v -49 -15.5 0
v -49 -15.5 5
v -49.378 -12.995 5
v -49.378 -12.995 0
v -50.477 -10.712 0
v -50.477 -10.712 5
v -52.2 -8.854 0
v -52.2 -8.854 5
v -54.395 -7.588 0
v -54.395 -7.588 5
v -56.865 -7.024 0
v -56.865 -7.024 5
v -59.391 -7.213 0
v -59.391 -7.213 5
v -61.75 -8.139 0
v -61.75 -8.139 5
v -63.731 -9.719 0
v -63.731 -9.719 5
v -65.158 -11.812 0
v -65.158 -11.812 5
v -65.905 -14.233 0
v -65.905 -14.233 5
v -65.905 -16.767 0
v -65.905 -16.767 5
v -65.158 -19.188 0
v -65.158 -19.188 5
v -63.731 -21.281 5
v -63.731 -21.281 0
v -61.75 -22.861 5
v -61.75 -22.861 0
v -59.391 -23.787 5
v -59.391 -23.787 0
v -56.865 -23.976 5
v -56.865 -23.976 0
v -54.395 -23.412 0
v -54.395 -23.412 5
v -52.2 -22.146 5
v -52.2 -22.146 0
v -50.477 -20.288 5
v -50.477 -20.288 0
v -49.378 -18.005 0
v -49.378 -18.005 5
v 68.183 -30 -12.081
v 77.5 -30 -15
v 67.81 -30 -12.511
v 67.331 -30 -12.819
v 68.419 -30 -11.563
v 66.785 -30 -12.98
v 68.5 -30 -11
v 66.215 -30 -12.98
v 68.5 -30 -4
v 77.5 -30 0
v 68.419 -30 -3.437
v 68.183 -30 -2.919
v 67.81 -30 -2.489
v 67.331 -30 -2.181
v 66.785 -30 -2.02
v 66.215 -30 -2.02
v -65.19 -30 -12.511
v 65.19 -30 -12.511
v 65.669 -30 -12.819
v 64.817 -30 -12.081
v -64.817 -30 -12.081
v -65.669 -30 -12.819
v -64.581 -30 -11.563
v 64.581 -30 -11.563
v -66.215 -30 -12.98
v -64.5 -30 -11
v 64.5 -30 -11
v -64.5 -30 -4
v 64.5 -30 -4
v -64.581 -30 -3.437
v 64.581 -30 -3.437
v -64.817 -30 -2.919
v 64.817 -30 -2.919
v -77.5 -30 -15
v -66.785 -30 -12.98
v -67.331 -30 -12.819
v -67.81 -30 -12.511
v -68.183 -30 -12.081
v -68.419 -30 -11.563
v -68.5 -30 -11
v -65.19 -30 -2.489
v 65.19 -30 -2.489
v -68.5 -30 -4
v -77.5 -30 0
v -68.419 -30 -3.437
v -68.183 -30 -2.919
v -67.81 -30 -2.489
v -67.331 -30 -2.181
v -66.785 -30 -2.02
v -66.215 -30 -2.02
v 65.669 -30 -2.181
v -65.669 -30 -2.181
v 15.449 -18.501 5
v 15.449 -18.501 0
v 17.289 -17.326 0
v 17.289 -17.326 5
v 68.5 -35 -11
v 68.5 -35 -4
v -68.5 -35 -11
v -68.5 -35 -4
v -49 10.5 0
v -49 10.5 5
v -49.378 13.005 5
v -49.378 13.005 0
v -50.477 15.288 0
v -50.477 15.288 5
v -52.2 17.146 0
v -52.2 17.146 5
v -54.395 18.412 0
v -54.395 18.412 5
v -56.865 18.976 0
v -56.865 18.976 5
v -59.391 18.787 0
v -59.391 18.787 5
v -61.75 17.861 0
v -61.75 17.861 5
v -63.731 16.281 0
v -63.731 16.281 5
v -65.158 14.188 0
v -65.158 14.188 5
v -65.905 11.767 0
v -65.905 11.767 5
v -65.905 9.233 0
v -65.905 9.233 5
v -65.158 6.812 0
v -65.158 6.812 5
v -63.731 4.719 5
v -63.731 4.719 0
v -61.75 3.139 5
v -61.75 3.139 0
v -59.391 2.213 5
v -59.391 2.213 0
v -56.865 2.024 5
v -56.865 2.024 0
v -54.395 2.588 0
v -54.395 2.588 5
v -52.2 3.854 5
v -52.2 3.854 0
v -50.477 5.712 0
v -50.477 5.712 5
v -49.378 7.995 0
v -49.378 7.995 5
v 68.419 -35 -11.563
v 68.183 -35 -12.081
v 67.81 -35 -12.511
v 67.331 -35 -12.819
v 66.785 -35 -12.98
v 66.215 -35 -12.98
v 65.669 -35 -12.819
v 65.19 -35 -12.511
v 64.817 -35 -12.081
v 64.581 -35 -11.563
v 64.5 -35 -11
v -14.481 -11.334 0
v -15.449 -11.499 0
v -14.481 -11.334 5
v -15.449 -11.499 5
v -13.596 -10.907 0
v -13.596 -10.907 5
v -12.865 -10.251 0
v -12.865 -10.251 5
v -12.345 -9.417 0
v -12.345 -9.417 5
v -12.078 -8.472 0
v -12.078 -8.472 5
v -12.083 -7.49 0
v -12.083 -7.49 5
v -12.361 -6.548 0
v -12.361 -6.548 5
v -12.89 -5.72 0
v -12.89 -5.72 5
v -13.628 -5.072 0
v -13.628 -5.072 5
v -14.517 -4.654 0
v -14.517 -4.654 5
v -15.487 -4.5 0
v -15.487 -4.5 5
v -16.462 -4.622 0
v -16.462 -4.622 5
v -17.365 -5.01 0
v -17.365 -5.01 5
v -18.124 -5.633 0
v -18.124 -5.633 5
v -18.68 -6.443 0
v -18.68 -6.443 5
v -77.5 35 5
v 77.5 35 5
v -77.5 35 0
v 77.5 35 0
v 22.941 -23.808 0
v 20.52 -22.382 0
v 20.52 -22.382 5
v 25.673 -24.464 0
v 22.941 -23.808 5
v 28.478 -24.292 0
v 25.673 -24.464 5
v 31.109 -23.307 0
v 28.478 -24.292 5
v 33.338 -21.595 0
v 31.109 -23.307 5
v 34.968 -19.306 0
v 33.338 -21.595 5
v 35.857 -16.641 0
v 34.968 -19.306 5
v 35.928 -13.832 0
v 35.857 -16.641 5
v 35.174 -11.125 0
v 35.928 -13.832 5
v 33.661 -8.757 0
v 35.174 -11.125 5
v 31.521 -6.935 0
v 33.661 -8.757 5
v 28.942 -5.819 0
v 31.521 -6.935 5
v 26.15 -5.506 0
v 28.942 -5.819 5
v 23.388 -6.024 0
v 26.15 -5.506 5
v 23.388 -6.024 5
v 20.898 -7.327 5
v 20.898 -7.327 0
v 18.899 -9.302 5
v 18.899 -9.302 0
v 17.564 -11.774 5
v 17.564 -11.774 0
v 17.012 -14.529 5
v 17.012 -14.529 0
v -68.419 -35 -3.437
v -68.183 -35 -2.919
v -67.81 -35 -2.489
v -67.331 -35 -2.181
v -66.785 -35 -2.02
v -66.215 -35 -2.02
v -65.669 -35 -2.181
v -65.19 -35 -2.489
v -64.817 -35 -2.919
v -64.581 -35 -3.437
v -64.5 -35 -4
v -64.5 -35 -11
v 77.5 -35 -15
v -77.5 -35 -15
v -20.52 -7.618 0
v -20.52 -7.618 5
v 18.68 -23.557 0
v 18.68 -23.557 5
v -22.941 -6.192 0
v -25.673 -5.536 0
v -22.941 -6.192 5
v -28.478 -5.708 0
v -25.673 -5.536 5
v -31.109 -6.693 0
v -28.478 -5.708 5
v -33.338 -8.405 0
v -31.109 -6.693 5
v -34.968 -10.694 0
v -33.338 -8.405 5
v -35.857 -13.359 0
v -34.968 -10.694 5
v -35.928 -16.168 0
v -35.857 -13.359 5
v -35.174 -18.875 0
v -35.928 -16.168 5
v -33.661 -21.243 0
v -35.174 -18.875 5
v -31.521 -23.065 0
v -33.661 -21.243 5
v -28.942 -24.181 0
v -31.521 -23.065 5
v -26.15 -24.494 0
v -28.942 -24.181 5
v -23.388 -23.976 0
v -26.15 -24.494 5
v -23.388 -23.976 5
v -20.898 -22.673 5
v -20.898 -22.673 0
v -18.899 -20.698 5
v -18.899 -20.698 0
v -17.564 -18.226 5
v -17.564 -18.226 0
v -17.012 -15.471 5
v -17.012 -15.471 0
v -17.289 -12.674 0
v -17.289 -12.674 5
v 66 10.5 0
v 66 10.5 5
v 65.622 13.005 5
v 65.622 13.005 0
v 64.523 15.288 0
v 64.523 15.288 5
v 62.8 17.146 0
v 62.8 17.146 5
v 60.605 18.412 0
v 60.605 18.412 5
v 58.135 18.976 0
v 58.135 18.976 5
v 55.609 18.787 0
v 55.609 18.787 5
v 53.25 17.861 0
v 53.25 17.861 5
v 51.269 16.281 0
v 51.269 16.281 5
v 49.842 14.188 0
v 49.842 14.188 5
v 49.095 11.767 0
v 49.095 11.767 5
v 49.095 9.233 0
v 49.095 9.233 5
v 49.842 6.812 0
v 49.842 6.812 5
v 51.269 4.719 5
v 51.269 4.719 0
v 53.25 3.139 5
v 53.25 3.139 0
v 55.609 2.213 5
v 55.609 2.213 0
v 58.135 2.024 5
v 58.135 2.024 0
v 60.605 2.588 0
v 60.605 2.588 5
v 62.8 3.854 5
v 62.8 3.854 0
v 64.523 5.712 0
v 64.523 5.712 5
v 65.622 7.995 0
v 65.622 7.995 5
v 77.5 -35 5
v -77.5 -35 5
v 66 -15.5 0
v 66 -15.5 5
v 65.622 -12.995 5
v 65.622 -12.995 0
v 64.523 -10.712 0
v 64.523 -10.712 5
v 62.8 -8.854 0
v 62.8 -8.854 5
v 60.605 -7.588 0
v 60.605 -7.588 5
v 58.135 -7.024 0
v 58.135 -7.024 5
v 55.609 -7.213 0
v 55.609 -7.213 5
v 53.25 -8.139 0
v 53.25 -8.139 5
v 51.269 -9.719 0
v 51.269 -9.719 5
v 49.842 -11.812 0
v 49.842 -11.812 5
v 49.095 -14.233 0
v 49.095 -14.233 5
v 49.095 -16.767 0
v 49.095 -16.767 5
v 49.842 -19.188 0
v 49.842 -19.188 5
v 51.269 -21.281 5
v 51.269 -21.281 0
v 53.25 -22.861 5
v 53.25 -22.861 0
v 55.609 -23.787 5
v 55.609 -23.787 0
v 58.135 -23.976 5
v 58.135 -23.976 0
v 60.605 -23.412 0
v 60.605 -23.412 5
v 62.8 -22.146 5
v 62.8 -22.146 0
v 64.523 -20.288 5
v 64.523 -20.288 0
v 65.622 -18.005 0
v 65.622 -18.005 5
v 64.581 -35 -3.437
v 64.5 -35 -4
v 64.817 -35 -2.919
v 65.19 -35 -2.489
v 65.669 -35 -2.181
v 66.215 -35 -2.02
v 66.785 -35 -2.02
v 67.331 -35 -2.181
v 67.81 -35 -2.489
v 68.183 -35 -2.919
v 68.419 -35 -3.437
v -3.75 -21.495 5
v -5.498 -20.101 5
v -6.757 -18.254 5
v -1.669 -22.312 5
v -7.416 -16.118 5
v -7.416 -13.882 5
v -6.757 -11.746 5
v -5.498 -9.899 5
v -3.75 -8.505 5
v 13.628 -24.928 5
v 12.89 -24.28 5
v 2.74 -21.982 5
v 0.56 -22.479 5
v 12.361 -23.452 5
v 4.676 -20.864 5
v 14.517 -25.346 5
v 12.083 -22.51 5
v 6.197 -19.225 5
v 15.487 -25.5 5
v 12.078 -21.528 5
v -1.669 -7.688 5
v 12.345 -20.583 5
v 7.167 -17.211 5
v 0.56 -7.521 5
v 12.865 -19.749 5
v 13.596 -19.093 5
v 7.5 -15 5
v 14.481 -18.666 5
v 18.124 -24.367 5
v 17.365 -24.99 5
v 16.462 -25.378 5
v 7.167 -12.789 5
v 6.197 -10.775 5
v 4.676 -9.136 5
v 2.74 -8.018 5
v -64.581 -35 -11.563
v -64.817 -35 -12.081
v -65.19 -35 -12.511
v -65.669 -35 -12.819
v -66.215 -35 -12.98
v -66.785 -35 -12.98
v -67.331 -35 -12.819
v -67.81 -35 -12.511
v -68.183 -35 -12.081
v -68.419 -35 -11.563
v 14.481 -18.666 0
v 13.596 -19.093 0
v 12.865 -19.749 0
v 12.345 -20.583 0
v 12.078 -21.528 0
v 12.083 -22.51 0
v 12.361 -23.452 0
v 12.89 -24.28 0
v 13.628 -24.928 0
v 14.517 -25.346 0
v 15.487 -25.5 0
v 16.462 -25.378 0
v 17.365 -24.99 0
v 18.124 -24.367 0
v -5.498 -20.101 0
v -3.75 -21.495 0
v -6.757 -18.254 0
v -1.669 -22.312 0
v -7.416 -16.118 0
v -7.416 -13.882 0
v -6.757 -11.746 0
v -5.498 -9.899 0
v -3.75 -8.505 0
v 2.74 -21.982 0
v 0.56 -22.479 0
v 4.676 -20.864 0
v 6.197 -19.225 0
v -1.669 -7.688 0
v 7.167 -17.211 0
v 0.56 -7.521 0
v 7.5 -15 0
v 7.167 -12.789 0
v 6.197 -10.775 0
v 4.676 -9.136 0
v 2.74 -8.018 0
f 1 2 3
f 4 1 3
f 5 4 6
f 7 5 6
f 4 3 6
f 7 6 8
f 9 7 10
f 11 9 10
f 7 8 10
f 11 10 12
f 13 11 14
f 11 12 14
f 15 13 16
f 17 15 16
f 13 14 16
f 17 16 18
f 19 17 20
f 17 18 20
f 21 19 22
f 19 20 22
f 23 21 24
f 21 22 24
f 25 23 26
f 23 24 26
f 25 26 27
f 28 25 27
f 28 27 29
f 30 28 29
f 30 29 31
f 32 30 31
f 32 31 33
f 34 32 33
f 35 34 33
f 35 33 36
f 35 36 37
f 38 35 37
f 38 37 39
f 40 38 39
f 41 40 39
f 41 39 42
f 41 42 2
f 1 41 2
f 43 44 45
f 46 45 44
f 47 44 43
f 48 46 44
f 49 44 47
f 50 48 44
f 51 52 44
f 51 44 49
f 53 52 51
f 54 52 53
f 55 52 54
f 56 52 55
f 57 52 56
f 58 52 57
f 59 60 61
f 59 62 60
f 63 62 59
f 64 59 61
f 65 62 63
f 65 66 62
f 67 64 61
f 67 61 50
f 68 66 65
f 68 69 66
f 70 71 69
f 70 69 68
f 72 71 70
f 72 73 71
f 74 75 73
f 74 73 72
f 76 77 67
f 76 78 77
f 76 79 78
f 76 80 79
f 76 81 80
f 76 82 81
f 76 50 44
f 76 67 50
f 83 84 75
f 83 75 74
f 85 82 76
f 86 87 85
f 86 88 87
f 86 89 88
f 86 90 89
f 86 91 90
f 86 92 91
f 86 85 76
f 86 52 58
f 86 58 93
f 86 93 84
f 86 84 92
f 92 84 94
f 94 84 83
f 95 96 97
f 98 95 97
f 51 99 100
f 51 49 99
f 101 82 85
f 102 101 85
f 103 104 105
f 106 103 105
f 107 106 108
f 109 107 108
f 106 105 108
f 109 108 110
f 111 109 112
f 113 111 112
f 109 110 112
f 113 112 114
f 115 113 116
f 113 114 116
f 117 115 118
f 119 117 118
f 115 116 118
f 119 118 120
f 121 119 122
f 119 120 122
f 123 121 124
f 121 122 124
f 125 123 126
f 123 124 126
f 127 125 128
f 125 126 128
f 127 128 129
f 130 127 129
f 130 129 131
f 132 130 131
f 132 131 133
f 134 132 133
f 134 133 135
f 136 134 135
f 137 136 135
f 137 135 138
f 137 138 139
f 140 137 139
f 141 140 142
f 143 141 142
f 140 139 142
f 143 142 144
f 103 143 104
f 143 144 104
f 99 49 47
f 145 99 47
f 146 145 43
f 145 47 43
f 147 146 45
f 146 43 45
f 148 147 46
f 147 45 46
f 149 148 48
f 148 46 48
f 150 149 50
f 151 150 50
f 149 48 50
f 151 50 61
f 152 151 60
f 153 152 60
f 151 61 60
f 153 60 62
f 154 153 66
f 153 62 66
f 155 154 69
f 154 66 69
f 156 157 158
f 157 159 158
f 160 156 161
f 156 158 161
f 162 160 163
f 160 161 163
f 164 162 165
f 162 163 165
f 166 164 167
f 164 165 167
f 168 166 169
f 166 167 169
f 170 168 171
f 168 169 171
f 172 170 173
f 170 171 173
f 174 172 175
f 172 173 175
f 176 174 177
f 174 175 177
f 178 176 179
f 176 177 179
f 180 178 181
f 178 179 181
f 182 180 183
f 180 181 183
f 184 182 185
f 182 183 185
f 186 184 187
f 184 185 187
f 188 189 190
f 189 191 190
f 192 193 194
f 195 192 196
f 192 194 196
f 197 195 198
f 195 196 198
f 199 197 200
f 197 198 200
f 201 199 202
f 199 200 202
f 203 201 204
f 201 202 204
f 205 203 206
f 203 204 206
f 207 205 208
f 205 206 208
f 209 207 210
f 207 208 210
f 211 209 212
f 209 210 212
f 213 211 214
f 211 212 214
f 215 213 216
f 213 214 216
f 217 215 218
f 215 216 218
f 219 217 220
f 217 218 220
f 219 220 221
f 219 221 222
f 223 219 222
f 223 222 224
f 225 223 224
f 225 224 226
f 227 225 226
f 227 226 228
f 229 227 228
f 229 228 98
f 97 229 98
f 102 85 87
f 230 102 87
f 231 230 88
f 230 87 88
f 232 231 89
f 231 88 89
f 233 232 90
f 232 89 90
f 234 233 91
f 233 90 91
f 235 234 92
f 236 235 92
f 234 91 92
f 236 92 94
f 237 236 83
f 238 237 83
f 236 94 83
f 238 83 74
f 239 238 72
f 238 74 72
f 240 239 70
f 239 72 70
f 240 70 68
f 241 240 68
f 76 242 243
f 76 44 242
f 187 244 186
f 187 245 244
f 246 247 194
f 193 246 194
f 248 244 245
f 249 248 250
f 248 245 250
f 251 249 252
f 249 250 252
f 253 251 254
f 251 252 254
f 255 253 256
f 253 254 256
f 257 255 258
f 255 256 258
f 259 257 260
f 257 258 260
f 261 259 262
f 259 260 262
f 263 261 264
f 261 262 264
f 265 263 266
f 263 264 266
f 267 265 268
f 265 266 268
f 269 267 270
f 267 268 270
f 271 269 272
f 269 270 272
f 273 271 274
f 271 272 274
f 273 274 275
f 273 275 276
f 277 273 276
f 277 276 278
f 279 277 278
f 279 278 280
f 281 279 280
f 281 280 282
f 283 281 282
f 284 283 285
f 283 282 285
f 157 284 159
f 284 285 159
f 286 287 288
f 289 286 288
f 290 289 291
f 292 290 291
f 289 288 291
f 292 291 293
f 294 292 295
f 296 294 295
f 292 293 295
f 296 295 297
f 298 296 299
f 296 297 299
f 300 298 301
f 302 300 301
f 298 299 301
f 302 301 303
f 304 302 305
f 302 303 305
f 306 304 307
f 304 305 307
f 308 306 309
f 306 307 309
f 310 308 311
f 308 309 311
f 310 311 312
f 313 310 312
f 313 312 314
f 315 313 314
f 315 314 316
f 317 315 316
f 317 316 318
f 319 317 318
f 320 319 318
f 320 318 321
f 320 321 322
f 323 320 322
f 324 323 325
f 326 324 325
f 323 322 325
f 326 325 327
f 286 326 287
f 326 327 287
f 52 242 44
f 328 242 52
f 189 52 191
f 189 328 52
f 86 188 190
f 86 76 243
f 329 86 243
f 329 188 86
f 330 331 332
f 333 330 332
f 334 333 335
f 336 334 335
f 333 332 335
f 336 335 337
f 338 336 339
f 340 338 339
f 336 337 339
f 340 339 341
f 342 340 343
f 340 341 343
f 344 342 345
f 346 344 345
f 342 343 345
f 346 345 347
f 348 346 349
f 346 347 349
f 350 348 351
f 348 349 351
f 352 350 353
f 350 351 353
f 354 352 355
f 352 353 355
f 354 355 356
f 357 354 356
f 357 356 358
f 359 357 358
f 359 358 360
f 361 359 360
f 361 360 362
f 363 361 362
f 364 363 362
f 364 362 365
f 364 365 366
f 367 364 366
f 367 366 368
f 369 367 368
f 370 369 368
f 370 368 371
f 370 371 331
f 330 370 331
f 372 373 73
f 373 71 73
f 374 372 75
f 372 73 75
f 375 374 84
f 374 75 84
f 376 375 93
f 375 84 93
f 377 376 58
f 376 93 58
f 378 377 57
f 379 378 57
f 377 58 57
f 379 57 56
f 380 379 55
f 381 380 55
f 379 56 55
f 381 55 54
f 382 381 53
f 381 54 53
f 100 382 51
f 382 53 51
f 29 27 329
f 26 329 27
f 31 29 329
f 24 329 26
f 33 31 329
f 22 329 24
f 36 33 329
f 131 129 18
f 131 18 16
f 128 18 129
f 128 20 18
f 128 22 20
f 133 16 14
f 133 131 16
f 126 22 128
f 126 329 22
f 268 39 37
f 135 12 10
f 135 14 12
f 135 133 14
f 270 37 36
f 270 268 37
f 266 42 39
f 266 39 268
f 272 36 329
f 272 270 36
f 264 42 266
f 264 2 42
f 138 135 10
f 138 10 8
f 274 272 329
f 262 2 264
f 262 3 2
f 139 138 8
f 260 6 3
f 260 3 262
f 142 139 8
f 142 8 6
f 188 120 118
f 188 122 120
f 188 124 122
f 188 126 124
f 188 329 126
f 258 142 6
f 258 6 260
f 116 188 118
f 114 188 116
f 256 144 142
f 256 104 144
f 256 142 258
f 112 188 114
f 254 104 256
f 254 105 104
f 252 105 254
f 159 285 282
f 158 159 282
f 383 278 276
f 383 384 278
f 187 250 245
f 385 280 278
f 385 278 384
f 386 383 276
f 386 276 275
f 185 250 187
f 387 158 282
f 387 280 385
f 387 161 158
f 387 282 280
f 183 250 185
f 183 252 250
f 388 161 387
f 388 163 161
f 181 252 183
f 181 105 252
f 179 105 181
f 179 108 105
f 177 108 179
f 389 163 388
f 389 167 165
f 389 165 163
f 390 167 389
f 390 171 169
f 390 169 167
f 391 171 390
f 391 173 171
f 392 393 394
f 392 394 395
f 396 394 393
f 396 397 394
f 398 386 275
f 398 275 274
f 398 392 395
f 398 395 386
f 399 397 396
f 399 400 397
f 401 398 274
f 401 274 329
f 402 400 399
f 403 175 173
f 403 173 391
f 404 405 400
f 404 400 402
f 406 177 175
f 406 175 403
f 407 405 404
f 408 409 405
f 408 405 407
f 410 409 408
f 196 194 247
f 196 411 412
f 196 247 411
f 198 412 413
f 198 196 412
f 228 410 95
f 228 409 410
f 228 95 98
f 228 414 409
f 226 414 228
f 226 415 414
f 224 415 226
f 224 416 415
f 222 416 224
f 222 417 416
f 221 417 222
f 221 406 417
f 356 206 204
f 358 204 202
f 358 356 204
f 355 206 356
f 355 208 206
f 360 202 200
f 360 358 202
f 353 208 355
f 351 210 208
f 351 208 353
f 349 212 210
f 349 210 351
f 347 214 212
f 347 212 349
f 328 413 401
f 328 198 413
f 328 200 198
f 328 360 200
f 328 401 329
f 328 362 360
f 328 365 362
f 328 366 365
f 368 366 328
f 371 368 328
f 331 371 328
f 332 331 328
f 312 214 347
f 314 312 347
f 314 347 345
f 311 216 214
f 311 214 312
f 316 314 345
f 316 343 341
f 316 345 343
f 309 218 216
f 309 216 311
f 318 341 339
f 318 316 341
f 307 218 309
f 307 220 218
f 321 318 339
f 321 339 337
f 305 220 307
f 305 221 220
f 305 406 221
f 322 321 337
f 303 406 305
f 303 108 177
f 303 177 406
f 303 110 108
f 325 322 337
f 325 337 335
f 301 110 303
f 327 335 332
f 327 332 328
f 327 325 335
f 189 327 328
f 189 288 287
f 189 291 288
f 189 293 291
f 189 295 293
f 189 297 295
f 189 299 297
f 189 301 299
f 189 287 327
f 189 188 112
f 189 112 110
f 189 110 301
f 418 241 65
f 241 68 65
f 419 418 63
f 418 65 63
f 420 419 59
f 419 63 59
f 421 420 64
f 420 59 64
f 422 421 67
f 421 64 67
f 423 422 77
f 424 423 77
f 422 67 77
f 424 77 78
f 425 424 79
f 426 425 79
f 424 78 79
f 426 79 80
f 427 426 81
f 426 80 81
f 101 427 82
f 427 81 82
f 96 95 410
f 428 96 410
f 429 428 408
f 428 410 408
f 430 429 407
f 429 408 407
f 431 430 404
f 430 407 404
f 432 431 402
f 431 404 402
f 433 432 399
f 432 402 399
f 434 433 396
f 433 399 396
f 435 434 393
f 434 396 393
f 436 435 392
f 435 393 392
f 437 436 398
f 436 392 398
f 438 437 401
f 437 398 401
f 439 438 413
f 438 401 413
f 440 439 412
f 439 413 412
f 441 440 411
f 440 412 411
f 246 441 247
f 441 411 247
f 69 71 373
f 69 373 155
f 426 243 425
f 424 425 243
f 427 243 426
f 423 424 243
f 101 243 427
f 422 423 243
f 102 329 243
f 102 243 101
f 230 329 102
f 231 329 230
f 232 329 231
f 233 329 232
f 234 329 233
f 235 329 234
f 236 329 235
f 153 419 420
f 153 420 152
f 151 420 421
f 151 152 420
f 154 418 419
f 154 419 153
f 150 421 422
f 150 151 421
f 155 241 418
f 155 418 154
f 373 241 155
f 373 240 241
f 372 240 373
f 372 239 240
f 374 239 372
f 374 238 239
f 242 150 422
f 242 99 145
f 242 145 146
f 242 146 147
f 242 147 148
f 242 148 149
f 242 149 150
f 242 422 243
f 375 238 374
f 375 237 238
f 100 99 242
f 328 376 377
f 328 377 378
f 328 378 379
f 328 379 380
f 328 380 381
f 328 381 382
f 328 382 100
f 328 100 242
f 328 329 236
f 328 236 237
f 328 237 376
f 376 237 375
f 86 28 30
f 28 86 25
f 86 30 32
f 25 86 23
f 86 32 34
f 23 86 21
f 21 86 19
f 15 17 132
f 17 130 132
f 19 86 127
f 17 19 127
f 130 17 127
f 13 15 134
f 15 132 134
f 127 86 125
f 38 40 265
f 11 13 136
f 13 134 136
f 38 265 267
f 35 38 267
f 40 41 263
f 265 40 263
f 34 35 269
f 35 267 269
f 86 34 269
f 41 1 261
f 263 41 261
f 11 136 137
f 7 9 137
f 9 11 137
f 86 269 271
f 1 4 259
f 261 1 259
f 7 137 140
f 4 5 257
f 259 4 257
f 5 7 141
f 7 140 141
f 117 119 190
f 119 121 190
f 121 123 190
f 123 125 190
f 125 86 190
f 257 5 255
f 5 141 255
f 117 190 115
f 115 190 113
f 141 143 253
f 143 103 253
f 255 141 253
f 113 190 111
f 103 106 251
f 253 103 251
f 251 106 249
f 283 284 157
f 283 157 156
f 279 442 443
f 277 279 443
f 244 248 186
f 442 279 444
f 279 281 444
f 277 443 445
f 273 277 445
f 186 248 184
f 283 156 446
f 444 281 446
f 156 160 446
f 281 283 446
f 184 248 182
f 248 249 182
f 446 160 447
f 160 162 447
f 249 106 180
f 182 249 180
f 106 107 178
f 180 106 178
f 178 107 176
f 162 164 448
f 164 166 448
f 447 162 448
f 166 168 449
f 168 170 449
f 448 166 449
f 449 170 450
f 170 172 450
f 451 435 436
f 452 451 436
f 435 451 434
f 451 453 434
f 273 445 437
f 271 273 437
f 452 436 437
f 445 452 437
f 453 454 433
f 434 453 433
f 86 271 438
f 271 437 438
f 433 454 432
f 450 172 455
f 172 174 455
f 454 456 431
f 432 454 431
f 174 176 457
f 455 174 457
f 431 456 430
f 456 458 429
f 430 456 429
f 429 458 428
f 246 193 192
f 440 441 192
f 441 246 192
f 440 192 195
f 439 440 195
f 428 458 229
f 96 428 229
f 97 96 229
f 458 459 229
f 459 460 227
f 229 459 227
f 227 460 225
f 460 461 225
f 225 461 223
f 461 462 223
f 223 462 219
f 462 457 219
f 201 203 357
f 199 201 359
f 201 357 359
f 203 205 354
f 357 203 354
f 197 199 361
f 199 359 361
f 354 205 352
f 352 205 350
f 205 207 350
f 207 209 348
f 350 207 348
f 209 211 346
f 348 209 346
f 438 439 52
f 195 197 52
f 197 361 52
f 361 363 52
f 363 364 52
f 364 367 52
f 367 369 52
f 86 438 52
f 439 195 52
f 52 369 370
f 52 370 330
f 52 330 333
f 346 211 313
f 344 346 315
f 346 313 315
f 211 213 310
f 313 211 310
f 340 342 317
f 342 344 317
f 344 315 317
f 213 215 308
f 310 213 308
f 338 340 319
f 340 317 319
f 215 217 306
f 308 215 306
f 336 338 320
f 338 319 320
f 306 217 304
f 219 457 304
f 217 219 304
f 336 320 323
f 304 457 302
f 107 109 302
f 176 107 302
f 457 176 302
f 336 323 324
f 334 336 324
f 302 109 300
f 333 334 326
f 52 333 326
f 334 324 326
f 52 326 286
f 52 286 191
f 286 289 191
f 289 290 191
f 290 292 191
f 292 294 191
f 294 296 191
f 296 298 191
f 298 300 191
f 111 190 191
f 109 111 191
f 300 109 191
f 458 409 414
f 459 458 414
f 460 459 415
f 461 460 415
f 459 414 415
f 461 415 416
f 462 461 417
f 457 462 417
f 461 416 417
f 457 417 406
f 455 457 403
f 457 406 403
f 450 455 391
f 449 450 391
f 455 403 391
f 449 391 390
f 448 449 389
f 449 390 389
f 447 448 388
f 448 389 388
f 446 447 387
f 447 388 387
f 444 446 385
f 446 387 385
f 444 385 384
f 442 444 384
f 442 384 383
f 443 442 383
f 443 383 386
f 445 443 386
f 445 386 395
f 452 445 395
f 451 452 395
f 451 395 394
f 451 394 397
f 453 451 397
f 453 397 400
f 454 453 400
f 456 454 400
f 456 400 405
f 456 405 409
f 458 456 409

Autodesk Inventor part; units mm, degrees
ref_plane "YZ Plane" through (0, 0, 0) normal (1, 0, 0) x (0, 1, 0)
ref_plane "XZ Plane" through (0, 0, 0) normal (0, 1, 0) x (-1, 0, 0)
ref_plane "XY Plane" through (0, 0, 0) normal (0, 0, 1) x (1, 0, 0)
sketch "Sketch1" plane through (0, 0, 0) normal (0, 0, 1) x (1, 0, 0)
  line L0 (-77.5, -35) -> (77.5, -35)
  line L1 (77.5, -35) -> (77.5, 35)
  line L2 (77.5, 35) -> (-77.5, 35)
  line L3 (-77.5, 35) -> (-77.5, -35)
  line L4 (-77.5, -35) -> (77.5, 35) construction
  line L5 (77.5, -35) -> (-77.5, 35) construction
  point P0 (0, 0)
  dimension "d23" = 155
  dimension "d24" = 70
extrude "Extrusion2" add sketch "Sketch1" along normal blind 5
sketch "Sketch2" plane through (0, 0, 5) normal (0, 0, 1) x (1, 0, 0)
  line L0 (-77.5, -35) -> (77.5, -35) projected
  line L1 (77.5, -35) -> (77.5, 35) projected
  line L2 (77.5, 35) -> (-77.5, 35) projected
  line L3 (-77.5, 35) -> (-77.5, -35) projected
  line L4 (-77.5, -15) -> (77.5, -15) construction
  line L5 (77.5, -35) -> (77.5, 35) construction
  circle A0 centre (0, -15) radius 7.5
  circle A1 centre (26.5, -15) radius 9.5
  line L6 (0, 35) -> (0, -35) construction
  line L7 (-77.5, -35) -> (77.5, -35) construction
  circle A2 centre (-26.5, -15) radius 9.5
  circle A3 centre (15.5455, -22) radius 3.5
  circle A4 centre (-15.5455, -8) radius 3.5
  point P0 (0, 0)
  dimension "d27" = 20
  dimension "d28" = 15
  dimension "d29" = 19
  dimension "d30" = 26.5
  dimension "d31" = 7
  dimension "d32" = 7
  dimension "d33" = 7
extrude "Extrusion3" cut sketch "Sketch2" against normal through all contours A0 | A1 | A3 | A2 | A4
sketch "Sketch3" plane through (0, 0, 5) normal (0, 0, 1) x (1, 0, 0)
  circle A0 centre (-26.5, -15) radius 9.5 projected
  circle A1 centre (-15.5455, -8) radius 3.5 projected
  circle A2 centre (26.5, -15) radius 9.5 projected
  circle A3 centre (15.5455, -22) radius 3.5 projected
  circle A4 centre (0, -15) radius 7.5 projected
  line L0 (-77.5, -35) -> (77.5, -35) projected
  line L1 (77.5, -35) -> (77.5, 35) projected
  line L2 (77.5, 35) -> (-77.5, 35) projected
  line L3 (-77.5, 35) -> (-77.5, -35) projected
  circle A5 centre (-26.5, -15) radius 9.5 projected
  line L4 (-20.5198, -7.6184) -> (-18.68, -6.4428)
  circle A6 centre (-15.5455, -8) radius 3.5 projected
  line L5 (-15.5455, -8) -> (-26.5, -15) construction
  line L6 (15.5455, -22) -> (26.5, -15) construction
  circle A7 centre (15.5455, -22) radius 3.5 projected
  line L7 (15.4493, -18.5013) -> (17.2891, -17.3257)
  line L8 (-17.2891, -12.6743) -> (-15.4493, -11.4987)
  line L9 (18.68, -23.5572) -> (20.5198, -22.3816)
  point P0 (0, 0)
  point P1 (-18.4948, -9.8846)
  point P2 (18.4948, -20.1154)
  dimension "d36" = 3
  dimension "d37" = 3
  dimension "d38" = 3
  dimension "d39" = 3
extrude "Extrusion4" cut sketch "Sketch3" against normal through all contours A0 A1 L8 | L4 A1 A0 | A2 A3 L7 | L9 A3 A2
sketch "Sketch4" plane through (0, 0, 5) normal (0, 0, 1) x (1, 0, 0)
  line L0 (-15.4493, -11.4987) -> (-17.2891, -12.6743) projected
  arc A0 (-20.5198, -7.6184) -> (-17.2891, -12.6743) centre (-26.5, -15) ccw projected
  line L1 (-20.5198, -7.6184) -> (-18.68, -6.4428) projected
  arc A1 (-15.4493, -11.4987) -> (-18.68, -6.4428) centre (-15.5455, -8) ccw projected
  line L2 (15.4493, -18.5013) -> (17.2891, -17.3257) projected
  arc A2 (20.5198, -22.3816) -> (17.2891, -17.3257) centre (26.5, -15) ccw projected
  line L3 (20.5198, -22.3816) -> (18.68, -23.5572) projected
  arc A3 (15.4493, -18.5013) -> (18.68, -23.5572) centre (15.5455, -22) ccw projected
  circle A4 centre (0, -15) radius 7.5 projected
  line L4 (-77.5, -35) -> (77.5, -35) projected
  line L5 (77.5, -35) -> (77.5, 35) projected
  line L6 (77.5, 35) -> (-77.5, 35) projected
  line L7 (-77.5, 35) -> (-77.5, -35) projected
  line L8 (-77.5, -25) -> (77.5, -25) construction
  line L9 (-67.5, -25) -> (-47.5, -25) construction
  line L10 (-47.5, -25) -> (-47.5, 20) construction
  line L11 (-47.5, 20) -> (-67.5, 20) construction
  line L12 (-67.5, 20) -> (-67.5, -25) construction
  line L13 (77.5, 35) -> (-77.5, 35) construction
  line L14 (0, 35) -> (0, -35) construction
  circle A5 centre (-57.5, 10.5) radius 8.5
  circle A6 centre (-57.5, -15.5) radius 8.5
  line L15 (-67.5, -2.5) -> (-47.5, -2.5) construction
  line L16 (-57.5, -2.5) -> (-57.5, 10.5) construction
  line L17 (-57.5, -2.5) -> (-57.5, -15.5) construction
  circle A7 centre (57.5, 10.5) radius 8.5
  circle A8 centre (57.5, -15.5) radius 8.5
  point P0 (0, 0)
  dimension "d42" = 10
  dimension "d43" = 10
  dimension "d44" = 20
  dimension "d45" = 45
  dimension "d46" = 17
  dimension "d48" = 26
extrude "Extrusion5" cut sketch "Sketch4" against normal through all contours A5 | A6 | A7 | A8
sketch "Sketch5" plane through (0, 0, 0) normal (0, 0, -1) x (-1, 0, 0)
  circle A0 centre (-57.5, 10.5) radius 8.5 projected
  circle A1 centre (57.5, 10.5) radius 8.5 projected
  circle A2 centre (57.5, -15.5) radius 8.5 projected
  circle A3 centre (-57.5, -15.5) radius 8.5 projected
  line L0 (17.2891, -12.6743) -> (15.4493, -11.4987) projected
  arc A4 (18.68, -6.4428) -> (15.4493, -11.4987) centre (15.5455, -8) ccw projected
  line L1 (18.68, -6.4428) -> (20.5198, -7.6184) projected
  arc A5 (17.2891, -12.6743) -> (20.5198, -7.6184) centre (26.5, -15) ccw projected
  line L2 (-17.2891, -17.3257) -> (-15.4493, -18.5013) projected
  arc A6 (-18.68, -23.5572) -> (-15.4493, -18.5013) centre (-15.5455, -22) ccw projected
  line L3 (-18.68, -23.5572) -> (-20.5198, -22.3816) projected
  arc A7 (-17.2891, -17.3257) -> (-20.5198, -22.3816) centre (-26.5, -15) ccw projected
  circle A8 centre (0, -15) radius 7.5 projected
  line L4 (77.5, -35) -> (-77.5, -35) projected
  line L5 (77.5, 35) -> (77.5, -35) projected
  line L6 (-77.5, 35) -> (77.5, 35) projected
  line L7 (-77.5, -35) -> (-77.5, 35) projected
  line L8 (-77.5, -30) -> (77.5, -30)
  line L9 (77.5, 35) -> (77.5, -35) construction
  line L10 (-77.5, -30) -> (77.5, -30)
  line L11 (77.5, -30) -> (77.5, -35)
  line L12 (77.5, -35) -> (-77.5, -35)
  line L13 (-77.5, -35) -> (-77.5, -30)
  point P0 (0, 0)
  dimension "d51" = 5
extrude "Extrusion6" add sketch "Sketch5" along normal blind 15 contours L4 L7 L8 L5
sketch "Sketch6" plane through (-77.5, -30, 0) normal (0, 1, 0) x (1, 0, 0)
  line L0 (155, 0) -> (0, 0) projected
  line L1 (155, 0) -> (155, 15) projected
  line L2 (0, 15) -> (155, 15) projected
  line L3 (0, 0) -> (0, 15) projected
  line L4 (146, 4) -> (142, 4)
  line L5 (142, 4) -> (142, 11)
  line L6 (142, 11) -> (146, 11)
  line L7 (146, 11) -> (146, 4)
  arc A0 (142, 4) -> (146, 4) centre (144, 4) ccw
  arc A1 (146, 11) -> (142, 11) centre (144, 11) ccw
  line L8 (155, 15) -> (0, 15) construction
  line L9 (77.5, 15) -> (77.5, 0) construction
  line L10 (9, 4) -> (13, 4)
  line L11 (13, 4) -> (13, 11)
  line L12 (13, 11) -> (9, 11)
  line L13 (9, 11) -> (9, 4)
  arc A2 (9, 4) -> (13, 4) centre (11, 4) ccw
  arc A3 (13, 11) -> (9, 11) centre (11, 11) ccw
  point P0 (146, 7.5)
  point P1 (155, 7.5)
  point P2 (9, 7.5)
  dimension "d54" = 4
  dimension "d55" = 7
  dimension "d56" = 9
extrude "Extrusion7" cut sketch "Sketch6" against normal through all contours A0 L4 | L4 L5 L6 L7 | L6 A1 | L13 L12 L11 L10 | L10 A2 | A3 L12
properties part number "frontPanel" material "S235"
